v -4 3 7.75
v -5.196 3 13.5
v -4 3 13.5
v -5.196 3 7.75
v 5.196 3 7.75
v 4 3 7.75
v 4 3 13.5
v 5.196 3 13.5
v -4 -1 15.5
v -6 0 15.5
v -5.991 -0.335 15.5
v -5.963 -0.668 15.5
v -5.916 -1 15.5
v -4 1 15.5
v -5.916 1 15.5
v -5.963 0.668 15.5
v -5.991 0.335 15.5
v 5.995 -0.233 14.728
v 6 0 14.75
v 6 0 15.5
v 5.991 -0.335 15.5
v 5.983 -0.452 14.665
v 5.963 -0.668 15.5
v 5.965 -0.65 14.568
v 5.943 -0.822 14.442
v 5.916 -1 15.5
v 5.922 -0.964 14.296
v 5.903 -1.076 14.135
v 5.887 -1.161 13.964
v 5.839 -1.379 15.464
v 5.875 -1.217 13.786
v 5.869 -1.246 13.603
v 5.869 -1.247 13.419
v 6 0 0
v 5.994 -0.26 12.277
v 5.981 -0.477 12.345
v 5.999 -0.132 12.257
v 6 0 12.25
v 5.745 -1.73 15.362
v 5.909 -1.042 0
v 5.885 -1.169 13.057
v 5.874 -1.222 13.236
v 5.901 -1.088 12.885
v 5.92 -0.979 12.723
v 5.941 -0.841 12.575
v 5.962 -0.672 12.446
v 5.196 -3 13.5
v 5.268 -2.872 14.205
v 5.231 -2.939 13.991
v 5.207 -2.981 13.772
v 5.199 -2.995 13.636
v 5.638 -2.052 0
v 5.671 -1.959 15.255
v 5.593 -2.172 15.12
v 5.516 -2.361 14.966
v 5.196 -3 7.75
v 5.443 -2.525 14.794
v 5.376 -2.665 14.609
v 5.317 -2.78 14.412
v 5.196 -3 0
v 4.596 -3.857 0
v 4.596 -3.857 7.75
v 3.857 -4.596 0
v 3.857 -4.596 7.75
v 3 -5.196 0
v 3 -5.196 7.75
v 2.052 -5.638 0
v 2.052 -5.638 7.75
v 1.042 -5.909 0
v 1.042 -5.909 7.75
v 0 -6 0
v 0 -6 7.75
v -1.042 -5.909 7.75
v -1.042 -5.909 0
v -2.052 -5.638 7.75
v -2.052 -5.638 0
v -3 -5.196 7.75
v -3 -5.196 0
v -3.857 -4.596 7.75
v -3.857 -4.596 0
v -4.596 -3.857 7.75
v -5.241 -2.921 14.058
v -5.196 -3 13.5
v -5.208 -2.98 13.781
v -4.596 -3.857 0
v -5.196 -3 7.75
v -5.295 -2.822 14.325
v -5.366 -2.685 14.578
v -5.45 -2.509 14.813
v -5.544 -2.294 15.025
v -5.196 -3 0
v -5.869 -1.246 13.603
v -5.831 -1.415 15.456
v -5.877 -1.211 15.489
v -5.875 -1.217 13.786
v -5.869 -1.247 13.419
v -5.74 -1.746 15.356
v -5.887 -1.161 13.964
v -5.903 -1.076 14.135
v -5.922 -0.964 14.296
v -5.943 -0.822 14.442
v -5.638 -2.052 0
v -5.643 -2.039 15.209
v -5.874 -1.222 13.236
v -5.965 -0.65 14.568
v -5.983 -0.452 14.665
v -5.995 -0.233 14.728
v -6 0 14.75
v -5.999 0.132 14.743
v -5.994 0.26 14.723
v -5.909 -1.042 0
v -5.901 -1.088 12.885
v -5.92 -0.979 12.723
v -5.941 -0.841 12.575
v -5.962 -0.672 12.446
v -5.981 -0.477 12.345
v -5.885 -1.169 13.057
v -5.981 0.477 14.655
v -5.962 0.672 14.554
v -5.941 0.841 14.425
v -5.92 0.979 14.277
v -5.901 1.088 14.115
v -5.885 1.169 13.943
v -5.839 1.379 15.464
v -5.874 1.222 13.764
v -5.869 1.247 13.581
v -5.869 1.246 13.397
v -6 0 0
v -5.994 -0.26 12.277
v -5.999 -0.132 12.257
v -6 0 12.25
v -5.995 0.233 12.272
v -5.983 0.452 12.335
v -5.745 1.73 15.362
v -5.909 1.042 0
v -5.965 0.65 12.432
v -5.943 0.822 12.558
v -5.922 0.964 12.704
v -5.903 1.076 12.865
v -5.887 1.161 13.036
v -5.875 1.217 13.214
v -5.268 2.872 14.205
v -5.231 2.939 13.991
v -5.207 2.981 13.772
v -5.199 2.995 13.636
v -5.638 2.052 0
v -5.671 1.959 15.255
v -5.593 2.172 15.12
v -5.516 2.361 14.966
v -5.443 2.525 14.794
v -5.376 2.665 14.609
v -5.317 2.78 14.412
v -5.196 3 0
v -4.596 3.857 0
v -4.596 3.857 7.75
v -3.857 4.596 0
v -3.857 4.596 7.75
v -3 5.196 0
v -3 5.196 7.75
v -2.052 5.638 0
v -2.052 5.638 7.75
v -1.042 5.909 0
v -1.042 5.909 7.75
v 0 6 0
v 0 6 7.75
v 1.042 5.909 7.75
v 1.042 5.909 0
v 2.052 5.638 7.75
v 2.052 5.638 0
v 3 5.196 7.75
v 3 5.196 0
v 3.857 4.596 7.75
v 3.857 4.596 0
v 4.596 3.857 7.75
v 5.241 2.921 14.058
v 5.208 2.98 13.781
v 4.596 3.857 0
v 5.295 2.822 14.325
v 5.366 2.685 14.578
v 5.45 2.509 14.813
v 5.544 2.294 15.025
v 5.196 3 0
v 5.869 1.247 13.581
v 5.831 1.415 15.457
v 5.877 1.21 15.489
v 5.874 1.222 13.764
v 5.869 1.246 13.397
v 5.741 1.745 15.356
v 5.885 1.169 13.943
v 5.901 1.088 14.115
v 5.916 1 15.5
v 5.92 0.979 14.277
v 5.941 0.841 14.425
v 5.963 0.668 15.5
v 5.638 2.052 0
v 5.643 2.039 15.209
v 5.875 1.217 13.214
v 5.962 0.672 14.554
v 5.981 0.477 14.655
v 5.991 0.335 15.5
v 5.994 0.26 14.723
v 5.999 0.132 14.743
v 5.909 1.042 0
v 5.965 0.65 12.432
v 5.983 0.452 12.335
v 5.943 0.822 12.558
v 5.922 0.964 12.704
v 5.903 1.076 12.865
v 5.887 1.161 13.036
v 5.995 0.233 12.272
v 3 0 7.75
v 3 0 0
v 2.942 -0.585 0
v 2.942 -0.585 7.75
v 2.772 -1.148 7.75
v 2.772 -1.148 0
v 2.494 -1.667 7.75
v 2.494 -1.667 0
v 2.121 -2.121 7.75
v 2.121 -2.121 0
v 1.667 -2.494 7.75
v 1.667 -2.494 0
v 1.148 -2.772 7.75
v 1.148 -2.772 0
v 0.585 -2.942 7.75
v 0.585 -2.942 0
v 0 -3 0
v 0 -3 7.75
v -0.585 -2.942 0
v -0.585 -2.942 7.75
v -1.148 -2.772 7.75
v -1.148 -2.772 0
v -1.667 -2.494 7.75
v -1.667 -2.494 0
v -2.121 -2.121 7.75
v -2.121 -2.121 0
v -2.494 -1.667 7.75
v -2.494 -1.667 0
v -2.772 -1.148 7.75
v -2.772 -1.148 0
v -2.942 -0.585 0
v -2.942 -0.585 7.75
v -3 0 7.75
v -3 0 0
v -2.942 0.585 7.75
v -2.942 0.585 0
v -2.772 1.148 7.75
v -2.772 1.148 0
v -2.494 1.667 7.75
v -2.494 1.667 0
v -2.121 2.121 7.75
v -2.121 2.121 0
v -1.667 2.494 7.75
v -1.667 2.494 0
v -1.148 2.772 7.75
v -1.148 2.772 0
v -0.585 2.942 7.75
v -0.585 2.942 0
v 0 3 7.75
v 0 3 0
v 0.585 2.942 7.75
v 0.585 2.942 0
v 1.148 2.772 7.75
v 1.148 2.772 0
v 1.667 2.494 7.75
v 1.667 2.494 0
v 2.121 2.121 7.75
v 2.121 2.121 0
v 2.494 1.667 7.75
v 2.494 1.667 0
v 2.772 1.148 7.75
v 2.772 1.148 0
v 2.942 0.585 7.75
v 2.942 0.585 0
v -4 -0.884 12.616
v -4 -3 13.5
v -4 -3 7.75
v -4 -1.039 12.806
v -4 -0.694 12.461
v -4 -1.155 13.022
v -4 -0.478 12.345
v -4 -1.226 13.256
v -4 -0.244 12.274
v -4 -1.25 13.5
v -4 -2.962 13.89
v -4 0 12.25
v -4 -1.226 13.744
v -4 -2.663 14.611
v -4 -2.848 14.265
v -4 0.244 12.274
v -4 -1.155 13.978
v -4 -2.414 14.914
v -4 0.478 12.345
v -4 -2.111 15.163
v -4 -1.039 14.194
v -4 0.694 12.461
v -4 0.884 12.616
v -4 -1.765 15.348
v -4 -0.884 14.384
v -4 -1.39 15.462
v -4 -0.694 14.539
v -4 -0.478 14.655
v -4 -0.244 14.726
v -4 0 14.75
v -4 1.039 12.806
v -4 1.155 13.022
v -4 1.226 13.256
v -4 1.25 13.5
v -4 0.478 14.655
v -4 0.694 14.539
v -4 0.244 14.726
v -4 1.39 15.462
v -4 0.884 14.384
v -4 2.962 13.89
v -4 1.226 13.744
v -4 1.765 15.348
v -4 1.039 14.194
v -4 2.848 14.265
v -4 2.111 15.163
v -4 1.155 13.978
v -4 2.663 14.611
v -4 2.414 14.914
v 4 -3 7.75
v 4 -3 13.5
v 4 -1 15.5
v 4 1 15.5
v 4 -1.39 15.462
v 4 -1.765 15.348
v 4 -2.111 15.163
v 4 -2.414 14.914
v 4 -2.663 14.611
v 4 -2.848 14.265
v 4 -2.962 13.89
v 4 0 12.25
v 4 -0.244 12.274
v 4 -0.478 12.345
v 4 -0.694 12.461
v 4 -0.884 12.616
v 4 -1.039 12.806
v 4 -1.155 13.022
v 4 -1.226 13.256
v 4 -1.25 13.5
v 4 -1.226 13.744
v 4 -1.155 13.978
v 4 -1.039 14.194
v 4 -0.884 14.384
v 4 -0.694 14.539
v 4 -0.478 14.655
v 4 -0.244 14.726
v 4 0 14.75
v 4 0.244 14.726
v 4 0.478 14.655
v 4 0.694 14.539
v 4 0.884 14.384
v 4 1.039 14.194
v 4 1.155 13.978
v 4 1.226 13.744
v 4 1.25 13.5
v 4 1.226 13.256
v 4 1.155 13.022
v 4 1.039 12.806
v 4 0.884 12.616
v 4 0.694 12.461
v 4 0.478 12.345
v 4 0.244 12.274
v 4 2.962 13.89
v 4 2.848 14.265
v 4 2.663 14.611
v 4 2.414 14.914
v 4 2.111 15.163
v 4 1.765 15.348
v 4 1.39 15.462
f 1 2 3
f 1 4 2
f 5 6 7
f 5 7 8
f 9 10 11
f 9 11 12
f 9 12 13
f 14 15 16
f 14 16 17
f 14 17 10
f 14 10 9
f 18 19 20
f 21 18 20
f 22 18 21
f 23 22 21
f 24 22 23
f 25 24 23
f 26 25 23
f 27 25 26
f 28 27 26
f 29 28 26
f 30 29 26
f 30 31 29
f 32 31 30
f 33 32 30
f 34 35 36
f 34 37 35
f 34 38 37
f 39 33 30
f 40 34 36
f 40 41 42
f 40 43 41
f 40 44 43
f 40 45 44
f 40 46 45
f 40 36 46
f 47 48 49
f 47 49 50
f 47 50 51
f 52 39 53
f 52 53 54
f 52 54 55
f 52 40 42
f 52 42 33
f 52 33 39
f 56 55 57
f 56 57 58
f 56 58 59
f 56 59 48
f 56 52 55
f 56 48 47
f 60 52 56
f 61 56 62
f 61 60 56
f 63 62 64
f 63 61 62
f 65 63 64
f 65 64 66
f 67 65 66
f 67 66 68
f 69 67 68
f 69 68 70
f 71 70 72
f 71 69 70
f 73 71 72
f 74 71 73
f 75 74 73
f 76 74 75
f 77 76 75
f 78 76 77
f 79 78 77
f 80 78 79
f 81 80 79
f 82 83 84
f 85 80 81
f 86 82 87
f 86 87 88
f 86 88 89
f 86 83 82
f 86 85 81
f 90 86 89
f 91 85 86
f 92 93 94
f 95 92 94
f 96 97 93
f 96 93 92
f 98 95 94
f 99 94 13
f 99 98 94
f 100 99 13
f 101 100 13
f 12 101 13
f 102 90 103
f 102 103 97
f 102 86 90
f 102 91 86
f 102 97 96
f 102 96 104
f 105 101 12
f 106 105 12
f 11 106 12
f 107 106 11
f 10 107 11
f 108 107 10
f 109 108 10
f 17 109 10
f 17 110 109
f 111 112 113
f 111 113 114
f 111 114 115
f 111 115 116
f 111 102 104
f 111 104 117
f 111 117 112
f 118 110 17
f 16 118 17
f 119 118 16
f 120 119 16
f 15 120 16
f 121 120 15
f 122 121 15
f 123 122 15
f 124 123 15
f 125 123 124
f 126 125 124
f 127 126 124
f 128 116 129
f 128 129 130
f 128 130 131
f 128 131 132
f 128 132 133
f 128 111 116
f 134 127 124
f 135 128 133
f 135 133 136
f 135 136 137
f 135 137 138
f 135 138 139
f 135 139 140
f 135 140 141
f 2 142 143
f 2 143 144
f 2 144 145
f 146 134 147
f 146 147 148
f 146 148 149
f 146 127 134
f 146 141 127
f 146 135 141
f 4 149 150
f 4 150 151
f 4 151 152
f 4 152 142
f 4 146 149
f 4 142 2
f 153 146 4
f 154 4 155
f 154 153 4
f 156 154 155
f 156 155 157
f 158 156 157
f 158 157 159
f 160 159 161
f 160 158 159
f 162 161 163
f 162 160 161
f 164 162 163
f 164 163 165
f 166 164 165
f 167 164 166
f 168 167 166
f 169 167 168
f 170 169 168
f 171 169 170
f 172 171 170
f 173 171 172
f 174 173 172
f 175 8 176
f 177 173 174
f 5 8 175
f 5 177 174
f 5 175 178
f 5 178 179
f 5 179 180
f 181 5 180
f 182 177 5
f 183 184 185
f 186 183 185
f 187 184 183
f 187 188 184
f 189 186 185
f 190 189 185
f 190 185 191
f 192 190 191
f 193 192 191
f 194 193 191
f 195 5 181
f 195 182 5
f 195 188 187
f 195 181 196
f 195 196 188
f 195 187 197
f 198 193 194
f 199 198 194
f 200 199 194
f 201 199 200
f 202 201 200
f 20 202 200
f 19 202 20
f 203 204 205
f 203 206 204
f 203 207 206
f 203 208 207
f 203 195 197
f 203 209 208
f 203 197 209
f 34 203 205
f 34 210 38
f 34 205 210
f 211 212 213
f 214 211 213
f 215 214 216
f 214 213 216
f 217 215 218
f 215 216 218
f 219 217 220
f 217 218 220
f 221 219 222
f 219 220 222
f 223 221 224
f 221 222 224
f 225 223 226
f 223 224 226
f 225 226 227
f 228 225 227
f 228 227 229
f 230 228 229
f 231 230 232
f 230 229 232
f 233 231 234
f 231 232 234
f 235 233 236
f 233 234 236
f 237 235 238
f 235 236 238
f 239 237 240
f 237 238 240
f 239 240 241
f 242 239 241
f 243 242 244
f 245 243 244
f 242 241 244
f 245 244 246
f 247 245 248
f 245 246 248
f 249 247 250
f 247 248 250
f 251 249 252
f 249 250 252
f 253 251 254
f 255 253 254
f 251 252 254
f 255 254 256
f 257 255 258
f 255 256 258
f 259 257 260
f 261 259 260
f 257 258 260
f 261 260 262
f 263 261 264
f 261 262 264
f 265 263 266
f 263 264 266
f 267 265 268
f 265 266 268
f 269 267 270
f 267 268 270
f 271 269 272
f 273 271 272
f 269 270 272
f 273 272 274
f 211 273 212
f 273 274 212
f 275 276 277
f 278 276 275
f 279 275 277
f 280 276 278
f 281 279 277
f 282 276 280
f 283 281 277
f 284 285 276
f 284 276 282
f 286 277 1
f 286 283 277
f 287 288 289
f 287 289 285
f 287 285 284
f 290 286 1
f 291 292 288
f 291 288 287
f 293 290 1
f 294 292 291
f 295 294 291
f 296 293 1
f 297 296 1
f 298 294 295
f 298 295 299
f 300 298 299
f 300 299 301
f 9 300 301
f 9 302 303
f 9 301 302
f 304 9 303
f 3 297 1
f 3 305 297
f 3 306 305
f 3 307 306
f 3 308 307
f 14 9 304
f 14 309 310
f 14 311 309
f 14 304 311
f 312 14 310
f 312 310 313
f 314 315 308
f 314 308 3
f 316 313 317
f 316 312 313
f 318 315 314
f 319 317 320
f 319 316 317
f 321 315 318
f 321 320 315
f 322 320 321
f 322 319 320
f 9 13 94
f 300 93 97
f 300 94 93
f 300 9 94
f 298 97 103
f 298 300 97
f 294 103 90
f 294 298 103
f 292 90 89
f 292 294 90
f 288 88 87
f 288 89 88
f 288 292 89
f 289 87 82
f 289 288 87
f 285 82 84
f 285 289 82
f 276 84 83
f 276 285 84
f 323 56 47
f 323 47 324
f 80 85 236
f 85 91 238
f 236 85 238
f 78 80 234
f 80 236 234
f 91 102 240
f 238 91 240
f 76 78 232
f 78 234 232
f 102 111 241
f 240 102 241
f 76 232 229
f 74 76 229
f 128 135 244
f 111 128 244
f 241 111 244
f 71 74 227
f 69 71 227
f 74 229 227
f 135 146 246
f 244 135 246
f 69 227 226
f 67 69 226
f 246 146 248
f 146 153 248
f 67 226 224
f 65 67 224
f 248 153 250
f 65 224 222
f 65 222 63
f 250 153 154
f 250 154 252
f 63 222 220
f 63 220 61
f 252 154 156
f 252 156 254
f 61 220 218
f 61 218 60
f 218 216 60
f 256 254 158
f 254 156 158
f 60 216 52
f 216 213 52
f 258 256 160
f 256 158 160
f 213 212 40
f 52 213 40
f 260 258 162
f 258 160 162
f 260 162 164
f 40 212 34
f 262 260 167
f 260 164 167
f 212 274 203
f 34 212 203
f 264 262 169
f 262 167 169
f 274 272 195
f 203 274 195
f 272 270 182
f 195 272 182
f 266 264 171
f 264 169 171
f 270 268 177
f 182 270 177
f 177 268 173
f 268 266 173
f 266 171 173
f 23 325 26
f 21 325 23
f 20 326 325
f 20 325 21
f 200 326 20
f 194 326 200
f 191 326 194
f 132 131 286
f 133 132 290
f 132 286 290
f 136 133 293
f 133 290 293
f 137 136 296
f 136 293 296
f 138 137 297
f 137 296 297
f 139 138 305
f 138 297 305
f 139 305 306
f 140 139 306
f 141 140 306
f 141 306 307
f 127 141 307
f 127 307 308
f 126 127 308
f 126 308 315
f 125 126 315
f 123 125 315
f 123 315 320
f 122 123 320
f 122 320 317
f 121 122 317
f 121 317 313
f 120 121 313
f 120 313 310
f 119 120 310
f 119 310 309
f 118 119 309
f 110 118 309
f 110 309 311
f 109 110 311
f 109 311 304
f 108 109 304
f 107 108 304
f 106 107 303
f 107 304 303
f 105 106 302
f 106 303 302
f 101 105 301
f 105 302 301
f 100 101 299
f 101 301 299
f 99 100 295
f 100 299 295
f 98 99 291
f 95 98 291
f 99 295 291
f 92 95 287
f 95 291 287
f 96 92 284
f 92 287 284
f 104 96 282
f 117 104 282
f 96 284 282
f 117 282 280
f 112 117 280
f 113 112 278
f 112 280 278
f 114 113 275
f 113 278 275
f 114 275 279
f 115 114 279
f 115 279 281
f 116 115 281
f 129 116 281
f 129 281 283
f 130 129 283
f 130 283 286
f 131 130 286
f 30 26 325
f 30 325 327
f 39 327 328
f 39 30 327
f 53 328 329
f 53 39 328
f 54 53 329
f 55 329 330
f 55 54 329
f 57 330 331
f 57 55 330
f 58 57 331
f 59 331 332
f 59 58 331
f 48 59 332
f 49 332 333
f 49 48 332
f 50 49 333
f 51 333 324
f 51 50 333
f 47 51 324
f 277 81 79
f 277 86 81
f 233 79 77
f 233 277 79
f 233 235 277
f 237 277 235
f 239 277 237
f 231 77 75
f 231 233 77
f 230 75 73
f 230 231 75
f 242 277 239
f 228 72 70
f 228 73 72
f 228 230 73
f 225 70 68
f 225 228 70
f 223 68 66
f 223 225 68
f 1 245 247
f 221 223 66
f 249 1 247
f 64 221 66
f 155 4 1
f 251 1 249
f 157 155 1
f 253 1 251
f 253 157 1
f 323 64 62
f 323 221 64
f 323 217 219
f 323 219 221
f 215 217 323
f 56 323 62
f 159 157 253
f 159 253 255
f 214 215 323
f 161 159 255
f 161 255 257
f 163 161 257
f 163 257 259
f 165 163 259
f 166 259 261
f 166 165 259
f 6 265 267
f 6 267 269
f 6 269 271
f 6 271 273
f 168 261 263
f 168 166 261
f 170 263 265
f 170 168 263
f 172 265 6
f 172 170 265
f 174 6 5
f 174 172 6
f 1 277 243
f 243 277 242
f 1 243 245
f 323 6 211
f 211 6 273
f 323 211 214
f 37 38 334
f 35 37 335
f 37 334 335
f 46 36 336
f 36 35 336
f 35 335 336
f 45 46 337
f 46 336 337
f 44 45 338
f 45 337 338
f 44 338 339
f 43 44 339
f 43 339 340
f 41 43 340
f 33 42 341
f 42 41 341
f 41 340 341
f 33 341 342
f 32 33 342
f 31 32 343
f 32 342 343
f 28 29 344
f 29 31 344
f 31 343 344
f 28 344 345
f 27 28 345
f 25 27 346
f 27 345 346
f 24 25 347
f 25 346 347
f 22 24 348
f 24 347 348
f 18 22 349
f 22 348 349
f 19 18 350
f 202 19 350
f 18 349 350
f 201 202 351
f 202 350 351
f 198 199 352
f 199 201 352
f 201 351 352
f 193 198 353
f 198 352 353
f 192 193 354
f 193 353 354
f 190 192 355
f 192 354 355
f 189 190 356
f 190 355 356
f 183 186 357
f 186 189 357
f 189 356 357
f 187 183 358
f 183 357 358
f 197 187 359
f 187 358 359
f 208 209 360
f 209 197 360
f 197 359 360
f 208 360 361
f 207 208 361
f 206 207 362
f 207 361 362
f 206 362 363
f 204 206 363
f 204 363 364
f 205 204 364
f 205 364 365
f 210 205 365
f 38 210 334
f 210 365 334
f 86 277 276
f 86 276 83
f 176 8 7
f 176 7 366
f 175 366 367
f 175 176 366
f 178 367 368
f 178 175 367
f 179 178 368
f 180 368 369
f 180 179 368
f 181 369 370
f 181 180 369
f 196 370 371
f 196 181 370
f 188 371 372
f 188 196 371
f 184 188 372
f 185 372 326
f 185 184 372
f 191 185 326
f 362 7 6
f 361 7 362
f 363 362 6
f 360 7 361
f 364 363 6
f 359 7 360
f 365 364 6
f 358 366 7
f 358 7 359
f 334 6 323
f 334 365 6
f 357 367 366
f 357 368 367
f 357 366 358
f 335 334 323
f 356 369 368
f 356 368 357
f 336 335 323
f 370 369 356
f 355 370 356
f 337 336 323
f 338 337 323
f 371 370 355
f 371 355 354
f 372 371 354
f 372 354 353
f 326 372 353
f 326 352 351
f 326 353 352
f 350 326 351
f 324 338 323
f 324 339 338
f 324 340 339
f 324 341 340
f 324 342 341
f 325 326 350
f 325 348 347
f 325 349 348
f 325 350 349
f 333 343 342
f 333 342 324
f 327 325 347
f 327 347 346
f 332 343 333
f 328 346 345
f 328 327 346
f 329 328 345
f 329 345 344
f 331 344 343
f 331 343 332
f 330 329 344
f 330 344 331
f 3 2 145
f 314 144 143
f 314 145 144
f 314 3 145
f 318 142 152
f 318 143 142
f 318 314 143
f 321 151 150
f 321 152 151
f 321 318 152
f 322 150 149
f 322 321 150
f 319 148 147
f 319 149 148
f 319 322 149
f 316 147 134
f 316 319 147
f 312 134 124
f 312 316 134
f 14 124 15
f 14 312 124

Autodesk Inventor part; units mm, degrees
ref_plane "YZ Plane" through (0, 0, 0) normal (1, 0, 0) x (0, 1, 0)
ref_plane "XZ Plane" through (0, 0, 0) normal (0, 1, 0) x (-1, 0, 0)
ref_plane "XY Plane" through (0, 0, 0) normal (0, 0, 1) x (1, 0, 0)
sketch "Sketch1" plane through (0, 0, 0) normal (0, 0, 1) x (1, 0, 0)
  circle A0 centre (0, 0) radius 6
  circle A1 centre (0, 0) radius 3
  dimension "d0" = 12
  dimension "d1" = 6
extrude "Extrusion1" add sketch "Sketch1" along normal blind 15.5
sketch "Sketch2" plane through (0, 0, 15.5) normal (0, 0, 1) x (1, 0, 0)
  line L0 (-4, 6) -> (4, 6)
  line L1 (4, 6) -> (4, -6)
  line L2 (4, -6) -> (-4, -6)
  line L3 (-4, -6) -> (-4, 6)
  circle A0 centre (0, 0) radius 6 construction
  point P0 (0, 6)
  point P1 (4, 0)
  point P2 (0, -6)
  dimension "d4" = 8
extrude "Extrusion2" cut sketch "Sketch2" against normal blind 7.75
sketch "Sketch3" plane through (-4, -4.4721, 15.5) normal (1, 0, 0) x (0, 0, -1)
  arc A0 (2, 8.9443) -> (0, 6.9443) centre (2, 6.9443) ccw
  line L0 (0, 0) -> (7.75, 0) projected
  line L1 (7.75, 0) -> (7.75, 0) projected
  line L2 (7.75, 0) -> (0, 0) projected
  line L3 (0, 8.9443) -> (0, 0) projected
  line L4 (0, 8.9443) -> (7.75, 8.9443) projected
  line L5 (7.75, 8.9443) -> (7.75, 8.9443) projected
  line L6 (7.75, 8.9443) -> (0, 8.9443) projected
  line L7 (0, 0) -> (0, 8.9443) projected
  line L8 (15.5, -1.5279) -> (15.5, 10.4721) projected
  line L9 (0, 8.9443) -> (0, 0) projected
  arc A1 (0, 2) -> (2, 0) centre (2, 2) ccw
  line L10 (0, 2) -> (0, 0)
  line L11 (2, 0) -> (0, 0)
  line L12 (0, 6.9443) -> (0, 8.9443)
  line L13 (2, 8.9443) -> (0, 8.9443)
  point P0 (15.5, 4.4721)
  dimension "d7" = 2
  dimension "d8" = 2
extrude "Extrusion3" cut sketch "Sketch3" along normal through all both and the other way through all
sketch "Sketch4" plane through (-4, -4.4721, 7.75) normal (1, 0, 0) x (0, 0, -1)
  circle A0 centre (-5.75, 4.4721) radius 1.25
  line L0 (-7.75, 6.9443) -> (-7.75, 2) projected
  point P0 (7.75, 4.4721)
  point P1 (-7.75, 4.4721)
  dimension "d11" = 2.5
  dimension "d12" = 2
extrude "Extrusion4" cut sketch "Sketch4" along normal through all both and the other way through all
sketch "Sketch5" plane through (0, 0, 7.75) normal (0, 0, 1) x (1, 0, 0)
  line L0 (-6, 3) -> (6, 3)
  line L1 (6, 3) -> (6, -3)
  line L2 (6, -3) -> (-6, -3)
  line L3 (-6, -3) -> (-6, 3)
  arc A0 (-5.467, 2.4721) -> (-5.467, -2.4721) centre (0, 0) ccw projected
  arc A1 (5.467, -2.4721) -> (5.467, 2.4721) centre (0, 0) ccw projected
  line L4 (-12.5137, 9.699) -> (15.0071, 9.699)
  line L5 (15.0071, 9.699) -> (15.0071, -9.2746)
  line L6 (15.0071, -9.2746) -> (-12.5137, -9.2746)
  line L7 (-12.5137, -9.2746) -> (-12.5137, 9.699)
  point P0 (0, 3)
  point P1 (-6, 0)
  dimension "d15" = 6
extrude "Extrusion5" cut sketch "Sketch5" along normal through all
fillet "Fillet1" radius 2 4 edges at (-4.5981, 3, 15.4291) (-4.5981, -3, 15.4291) (4.5981, 3, 15.4291) (4.5981, -3, 15.4291)
properties part number "P1" material "Steel"
